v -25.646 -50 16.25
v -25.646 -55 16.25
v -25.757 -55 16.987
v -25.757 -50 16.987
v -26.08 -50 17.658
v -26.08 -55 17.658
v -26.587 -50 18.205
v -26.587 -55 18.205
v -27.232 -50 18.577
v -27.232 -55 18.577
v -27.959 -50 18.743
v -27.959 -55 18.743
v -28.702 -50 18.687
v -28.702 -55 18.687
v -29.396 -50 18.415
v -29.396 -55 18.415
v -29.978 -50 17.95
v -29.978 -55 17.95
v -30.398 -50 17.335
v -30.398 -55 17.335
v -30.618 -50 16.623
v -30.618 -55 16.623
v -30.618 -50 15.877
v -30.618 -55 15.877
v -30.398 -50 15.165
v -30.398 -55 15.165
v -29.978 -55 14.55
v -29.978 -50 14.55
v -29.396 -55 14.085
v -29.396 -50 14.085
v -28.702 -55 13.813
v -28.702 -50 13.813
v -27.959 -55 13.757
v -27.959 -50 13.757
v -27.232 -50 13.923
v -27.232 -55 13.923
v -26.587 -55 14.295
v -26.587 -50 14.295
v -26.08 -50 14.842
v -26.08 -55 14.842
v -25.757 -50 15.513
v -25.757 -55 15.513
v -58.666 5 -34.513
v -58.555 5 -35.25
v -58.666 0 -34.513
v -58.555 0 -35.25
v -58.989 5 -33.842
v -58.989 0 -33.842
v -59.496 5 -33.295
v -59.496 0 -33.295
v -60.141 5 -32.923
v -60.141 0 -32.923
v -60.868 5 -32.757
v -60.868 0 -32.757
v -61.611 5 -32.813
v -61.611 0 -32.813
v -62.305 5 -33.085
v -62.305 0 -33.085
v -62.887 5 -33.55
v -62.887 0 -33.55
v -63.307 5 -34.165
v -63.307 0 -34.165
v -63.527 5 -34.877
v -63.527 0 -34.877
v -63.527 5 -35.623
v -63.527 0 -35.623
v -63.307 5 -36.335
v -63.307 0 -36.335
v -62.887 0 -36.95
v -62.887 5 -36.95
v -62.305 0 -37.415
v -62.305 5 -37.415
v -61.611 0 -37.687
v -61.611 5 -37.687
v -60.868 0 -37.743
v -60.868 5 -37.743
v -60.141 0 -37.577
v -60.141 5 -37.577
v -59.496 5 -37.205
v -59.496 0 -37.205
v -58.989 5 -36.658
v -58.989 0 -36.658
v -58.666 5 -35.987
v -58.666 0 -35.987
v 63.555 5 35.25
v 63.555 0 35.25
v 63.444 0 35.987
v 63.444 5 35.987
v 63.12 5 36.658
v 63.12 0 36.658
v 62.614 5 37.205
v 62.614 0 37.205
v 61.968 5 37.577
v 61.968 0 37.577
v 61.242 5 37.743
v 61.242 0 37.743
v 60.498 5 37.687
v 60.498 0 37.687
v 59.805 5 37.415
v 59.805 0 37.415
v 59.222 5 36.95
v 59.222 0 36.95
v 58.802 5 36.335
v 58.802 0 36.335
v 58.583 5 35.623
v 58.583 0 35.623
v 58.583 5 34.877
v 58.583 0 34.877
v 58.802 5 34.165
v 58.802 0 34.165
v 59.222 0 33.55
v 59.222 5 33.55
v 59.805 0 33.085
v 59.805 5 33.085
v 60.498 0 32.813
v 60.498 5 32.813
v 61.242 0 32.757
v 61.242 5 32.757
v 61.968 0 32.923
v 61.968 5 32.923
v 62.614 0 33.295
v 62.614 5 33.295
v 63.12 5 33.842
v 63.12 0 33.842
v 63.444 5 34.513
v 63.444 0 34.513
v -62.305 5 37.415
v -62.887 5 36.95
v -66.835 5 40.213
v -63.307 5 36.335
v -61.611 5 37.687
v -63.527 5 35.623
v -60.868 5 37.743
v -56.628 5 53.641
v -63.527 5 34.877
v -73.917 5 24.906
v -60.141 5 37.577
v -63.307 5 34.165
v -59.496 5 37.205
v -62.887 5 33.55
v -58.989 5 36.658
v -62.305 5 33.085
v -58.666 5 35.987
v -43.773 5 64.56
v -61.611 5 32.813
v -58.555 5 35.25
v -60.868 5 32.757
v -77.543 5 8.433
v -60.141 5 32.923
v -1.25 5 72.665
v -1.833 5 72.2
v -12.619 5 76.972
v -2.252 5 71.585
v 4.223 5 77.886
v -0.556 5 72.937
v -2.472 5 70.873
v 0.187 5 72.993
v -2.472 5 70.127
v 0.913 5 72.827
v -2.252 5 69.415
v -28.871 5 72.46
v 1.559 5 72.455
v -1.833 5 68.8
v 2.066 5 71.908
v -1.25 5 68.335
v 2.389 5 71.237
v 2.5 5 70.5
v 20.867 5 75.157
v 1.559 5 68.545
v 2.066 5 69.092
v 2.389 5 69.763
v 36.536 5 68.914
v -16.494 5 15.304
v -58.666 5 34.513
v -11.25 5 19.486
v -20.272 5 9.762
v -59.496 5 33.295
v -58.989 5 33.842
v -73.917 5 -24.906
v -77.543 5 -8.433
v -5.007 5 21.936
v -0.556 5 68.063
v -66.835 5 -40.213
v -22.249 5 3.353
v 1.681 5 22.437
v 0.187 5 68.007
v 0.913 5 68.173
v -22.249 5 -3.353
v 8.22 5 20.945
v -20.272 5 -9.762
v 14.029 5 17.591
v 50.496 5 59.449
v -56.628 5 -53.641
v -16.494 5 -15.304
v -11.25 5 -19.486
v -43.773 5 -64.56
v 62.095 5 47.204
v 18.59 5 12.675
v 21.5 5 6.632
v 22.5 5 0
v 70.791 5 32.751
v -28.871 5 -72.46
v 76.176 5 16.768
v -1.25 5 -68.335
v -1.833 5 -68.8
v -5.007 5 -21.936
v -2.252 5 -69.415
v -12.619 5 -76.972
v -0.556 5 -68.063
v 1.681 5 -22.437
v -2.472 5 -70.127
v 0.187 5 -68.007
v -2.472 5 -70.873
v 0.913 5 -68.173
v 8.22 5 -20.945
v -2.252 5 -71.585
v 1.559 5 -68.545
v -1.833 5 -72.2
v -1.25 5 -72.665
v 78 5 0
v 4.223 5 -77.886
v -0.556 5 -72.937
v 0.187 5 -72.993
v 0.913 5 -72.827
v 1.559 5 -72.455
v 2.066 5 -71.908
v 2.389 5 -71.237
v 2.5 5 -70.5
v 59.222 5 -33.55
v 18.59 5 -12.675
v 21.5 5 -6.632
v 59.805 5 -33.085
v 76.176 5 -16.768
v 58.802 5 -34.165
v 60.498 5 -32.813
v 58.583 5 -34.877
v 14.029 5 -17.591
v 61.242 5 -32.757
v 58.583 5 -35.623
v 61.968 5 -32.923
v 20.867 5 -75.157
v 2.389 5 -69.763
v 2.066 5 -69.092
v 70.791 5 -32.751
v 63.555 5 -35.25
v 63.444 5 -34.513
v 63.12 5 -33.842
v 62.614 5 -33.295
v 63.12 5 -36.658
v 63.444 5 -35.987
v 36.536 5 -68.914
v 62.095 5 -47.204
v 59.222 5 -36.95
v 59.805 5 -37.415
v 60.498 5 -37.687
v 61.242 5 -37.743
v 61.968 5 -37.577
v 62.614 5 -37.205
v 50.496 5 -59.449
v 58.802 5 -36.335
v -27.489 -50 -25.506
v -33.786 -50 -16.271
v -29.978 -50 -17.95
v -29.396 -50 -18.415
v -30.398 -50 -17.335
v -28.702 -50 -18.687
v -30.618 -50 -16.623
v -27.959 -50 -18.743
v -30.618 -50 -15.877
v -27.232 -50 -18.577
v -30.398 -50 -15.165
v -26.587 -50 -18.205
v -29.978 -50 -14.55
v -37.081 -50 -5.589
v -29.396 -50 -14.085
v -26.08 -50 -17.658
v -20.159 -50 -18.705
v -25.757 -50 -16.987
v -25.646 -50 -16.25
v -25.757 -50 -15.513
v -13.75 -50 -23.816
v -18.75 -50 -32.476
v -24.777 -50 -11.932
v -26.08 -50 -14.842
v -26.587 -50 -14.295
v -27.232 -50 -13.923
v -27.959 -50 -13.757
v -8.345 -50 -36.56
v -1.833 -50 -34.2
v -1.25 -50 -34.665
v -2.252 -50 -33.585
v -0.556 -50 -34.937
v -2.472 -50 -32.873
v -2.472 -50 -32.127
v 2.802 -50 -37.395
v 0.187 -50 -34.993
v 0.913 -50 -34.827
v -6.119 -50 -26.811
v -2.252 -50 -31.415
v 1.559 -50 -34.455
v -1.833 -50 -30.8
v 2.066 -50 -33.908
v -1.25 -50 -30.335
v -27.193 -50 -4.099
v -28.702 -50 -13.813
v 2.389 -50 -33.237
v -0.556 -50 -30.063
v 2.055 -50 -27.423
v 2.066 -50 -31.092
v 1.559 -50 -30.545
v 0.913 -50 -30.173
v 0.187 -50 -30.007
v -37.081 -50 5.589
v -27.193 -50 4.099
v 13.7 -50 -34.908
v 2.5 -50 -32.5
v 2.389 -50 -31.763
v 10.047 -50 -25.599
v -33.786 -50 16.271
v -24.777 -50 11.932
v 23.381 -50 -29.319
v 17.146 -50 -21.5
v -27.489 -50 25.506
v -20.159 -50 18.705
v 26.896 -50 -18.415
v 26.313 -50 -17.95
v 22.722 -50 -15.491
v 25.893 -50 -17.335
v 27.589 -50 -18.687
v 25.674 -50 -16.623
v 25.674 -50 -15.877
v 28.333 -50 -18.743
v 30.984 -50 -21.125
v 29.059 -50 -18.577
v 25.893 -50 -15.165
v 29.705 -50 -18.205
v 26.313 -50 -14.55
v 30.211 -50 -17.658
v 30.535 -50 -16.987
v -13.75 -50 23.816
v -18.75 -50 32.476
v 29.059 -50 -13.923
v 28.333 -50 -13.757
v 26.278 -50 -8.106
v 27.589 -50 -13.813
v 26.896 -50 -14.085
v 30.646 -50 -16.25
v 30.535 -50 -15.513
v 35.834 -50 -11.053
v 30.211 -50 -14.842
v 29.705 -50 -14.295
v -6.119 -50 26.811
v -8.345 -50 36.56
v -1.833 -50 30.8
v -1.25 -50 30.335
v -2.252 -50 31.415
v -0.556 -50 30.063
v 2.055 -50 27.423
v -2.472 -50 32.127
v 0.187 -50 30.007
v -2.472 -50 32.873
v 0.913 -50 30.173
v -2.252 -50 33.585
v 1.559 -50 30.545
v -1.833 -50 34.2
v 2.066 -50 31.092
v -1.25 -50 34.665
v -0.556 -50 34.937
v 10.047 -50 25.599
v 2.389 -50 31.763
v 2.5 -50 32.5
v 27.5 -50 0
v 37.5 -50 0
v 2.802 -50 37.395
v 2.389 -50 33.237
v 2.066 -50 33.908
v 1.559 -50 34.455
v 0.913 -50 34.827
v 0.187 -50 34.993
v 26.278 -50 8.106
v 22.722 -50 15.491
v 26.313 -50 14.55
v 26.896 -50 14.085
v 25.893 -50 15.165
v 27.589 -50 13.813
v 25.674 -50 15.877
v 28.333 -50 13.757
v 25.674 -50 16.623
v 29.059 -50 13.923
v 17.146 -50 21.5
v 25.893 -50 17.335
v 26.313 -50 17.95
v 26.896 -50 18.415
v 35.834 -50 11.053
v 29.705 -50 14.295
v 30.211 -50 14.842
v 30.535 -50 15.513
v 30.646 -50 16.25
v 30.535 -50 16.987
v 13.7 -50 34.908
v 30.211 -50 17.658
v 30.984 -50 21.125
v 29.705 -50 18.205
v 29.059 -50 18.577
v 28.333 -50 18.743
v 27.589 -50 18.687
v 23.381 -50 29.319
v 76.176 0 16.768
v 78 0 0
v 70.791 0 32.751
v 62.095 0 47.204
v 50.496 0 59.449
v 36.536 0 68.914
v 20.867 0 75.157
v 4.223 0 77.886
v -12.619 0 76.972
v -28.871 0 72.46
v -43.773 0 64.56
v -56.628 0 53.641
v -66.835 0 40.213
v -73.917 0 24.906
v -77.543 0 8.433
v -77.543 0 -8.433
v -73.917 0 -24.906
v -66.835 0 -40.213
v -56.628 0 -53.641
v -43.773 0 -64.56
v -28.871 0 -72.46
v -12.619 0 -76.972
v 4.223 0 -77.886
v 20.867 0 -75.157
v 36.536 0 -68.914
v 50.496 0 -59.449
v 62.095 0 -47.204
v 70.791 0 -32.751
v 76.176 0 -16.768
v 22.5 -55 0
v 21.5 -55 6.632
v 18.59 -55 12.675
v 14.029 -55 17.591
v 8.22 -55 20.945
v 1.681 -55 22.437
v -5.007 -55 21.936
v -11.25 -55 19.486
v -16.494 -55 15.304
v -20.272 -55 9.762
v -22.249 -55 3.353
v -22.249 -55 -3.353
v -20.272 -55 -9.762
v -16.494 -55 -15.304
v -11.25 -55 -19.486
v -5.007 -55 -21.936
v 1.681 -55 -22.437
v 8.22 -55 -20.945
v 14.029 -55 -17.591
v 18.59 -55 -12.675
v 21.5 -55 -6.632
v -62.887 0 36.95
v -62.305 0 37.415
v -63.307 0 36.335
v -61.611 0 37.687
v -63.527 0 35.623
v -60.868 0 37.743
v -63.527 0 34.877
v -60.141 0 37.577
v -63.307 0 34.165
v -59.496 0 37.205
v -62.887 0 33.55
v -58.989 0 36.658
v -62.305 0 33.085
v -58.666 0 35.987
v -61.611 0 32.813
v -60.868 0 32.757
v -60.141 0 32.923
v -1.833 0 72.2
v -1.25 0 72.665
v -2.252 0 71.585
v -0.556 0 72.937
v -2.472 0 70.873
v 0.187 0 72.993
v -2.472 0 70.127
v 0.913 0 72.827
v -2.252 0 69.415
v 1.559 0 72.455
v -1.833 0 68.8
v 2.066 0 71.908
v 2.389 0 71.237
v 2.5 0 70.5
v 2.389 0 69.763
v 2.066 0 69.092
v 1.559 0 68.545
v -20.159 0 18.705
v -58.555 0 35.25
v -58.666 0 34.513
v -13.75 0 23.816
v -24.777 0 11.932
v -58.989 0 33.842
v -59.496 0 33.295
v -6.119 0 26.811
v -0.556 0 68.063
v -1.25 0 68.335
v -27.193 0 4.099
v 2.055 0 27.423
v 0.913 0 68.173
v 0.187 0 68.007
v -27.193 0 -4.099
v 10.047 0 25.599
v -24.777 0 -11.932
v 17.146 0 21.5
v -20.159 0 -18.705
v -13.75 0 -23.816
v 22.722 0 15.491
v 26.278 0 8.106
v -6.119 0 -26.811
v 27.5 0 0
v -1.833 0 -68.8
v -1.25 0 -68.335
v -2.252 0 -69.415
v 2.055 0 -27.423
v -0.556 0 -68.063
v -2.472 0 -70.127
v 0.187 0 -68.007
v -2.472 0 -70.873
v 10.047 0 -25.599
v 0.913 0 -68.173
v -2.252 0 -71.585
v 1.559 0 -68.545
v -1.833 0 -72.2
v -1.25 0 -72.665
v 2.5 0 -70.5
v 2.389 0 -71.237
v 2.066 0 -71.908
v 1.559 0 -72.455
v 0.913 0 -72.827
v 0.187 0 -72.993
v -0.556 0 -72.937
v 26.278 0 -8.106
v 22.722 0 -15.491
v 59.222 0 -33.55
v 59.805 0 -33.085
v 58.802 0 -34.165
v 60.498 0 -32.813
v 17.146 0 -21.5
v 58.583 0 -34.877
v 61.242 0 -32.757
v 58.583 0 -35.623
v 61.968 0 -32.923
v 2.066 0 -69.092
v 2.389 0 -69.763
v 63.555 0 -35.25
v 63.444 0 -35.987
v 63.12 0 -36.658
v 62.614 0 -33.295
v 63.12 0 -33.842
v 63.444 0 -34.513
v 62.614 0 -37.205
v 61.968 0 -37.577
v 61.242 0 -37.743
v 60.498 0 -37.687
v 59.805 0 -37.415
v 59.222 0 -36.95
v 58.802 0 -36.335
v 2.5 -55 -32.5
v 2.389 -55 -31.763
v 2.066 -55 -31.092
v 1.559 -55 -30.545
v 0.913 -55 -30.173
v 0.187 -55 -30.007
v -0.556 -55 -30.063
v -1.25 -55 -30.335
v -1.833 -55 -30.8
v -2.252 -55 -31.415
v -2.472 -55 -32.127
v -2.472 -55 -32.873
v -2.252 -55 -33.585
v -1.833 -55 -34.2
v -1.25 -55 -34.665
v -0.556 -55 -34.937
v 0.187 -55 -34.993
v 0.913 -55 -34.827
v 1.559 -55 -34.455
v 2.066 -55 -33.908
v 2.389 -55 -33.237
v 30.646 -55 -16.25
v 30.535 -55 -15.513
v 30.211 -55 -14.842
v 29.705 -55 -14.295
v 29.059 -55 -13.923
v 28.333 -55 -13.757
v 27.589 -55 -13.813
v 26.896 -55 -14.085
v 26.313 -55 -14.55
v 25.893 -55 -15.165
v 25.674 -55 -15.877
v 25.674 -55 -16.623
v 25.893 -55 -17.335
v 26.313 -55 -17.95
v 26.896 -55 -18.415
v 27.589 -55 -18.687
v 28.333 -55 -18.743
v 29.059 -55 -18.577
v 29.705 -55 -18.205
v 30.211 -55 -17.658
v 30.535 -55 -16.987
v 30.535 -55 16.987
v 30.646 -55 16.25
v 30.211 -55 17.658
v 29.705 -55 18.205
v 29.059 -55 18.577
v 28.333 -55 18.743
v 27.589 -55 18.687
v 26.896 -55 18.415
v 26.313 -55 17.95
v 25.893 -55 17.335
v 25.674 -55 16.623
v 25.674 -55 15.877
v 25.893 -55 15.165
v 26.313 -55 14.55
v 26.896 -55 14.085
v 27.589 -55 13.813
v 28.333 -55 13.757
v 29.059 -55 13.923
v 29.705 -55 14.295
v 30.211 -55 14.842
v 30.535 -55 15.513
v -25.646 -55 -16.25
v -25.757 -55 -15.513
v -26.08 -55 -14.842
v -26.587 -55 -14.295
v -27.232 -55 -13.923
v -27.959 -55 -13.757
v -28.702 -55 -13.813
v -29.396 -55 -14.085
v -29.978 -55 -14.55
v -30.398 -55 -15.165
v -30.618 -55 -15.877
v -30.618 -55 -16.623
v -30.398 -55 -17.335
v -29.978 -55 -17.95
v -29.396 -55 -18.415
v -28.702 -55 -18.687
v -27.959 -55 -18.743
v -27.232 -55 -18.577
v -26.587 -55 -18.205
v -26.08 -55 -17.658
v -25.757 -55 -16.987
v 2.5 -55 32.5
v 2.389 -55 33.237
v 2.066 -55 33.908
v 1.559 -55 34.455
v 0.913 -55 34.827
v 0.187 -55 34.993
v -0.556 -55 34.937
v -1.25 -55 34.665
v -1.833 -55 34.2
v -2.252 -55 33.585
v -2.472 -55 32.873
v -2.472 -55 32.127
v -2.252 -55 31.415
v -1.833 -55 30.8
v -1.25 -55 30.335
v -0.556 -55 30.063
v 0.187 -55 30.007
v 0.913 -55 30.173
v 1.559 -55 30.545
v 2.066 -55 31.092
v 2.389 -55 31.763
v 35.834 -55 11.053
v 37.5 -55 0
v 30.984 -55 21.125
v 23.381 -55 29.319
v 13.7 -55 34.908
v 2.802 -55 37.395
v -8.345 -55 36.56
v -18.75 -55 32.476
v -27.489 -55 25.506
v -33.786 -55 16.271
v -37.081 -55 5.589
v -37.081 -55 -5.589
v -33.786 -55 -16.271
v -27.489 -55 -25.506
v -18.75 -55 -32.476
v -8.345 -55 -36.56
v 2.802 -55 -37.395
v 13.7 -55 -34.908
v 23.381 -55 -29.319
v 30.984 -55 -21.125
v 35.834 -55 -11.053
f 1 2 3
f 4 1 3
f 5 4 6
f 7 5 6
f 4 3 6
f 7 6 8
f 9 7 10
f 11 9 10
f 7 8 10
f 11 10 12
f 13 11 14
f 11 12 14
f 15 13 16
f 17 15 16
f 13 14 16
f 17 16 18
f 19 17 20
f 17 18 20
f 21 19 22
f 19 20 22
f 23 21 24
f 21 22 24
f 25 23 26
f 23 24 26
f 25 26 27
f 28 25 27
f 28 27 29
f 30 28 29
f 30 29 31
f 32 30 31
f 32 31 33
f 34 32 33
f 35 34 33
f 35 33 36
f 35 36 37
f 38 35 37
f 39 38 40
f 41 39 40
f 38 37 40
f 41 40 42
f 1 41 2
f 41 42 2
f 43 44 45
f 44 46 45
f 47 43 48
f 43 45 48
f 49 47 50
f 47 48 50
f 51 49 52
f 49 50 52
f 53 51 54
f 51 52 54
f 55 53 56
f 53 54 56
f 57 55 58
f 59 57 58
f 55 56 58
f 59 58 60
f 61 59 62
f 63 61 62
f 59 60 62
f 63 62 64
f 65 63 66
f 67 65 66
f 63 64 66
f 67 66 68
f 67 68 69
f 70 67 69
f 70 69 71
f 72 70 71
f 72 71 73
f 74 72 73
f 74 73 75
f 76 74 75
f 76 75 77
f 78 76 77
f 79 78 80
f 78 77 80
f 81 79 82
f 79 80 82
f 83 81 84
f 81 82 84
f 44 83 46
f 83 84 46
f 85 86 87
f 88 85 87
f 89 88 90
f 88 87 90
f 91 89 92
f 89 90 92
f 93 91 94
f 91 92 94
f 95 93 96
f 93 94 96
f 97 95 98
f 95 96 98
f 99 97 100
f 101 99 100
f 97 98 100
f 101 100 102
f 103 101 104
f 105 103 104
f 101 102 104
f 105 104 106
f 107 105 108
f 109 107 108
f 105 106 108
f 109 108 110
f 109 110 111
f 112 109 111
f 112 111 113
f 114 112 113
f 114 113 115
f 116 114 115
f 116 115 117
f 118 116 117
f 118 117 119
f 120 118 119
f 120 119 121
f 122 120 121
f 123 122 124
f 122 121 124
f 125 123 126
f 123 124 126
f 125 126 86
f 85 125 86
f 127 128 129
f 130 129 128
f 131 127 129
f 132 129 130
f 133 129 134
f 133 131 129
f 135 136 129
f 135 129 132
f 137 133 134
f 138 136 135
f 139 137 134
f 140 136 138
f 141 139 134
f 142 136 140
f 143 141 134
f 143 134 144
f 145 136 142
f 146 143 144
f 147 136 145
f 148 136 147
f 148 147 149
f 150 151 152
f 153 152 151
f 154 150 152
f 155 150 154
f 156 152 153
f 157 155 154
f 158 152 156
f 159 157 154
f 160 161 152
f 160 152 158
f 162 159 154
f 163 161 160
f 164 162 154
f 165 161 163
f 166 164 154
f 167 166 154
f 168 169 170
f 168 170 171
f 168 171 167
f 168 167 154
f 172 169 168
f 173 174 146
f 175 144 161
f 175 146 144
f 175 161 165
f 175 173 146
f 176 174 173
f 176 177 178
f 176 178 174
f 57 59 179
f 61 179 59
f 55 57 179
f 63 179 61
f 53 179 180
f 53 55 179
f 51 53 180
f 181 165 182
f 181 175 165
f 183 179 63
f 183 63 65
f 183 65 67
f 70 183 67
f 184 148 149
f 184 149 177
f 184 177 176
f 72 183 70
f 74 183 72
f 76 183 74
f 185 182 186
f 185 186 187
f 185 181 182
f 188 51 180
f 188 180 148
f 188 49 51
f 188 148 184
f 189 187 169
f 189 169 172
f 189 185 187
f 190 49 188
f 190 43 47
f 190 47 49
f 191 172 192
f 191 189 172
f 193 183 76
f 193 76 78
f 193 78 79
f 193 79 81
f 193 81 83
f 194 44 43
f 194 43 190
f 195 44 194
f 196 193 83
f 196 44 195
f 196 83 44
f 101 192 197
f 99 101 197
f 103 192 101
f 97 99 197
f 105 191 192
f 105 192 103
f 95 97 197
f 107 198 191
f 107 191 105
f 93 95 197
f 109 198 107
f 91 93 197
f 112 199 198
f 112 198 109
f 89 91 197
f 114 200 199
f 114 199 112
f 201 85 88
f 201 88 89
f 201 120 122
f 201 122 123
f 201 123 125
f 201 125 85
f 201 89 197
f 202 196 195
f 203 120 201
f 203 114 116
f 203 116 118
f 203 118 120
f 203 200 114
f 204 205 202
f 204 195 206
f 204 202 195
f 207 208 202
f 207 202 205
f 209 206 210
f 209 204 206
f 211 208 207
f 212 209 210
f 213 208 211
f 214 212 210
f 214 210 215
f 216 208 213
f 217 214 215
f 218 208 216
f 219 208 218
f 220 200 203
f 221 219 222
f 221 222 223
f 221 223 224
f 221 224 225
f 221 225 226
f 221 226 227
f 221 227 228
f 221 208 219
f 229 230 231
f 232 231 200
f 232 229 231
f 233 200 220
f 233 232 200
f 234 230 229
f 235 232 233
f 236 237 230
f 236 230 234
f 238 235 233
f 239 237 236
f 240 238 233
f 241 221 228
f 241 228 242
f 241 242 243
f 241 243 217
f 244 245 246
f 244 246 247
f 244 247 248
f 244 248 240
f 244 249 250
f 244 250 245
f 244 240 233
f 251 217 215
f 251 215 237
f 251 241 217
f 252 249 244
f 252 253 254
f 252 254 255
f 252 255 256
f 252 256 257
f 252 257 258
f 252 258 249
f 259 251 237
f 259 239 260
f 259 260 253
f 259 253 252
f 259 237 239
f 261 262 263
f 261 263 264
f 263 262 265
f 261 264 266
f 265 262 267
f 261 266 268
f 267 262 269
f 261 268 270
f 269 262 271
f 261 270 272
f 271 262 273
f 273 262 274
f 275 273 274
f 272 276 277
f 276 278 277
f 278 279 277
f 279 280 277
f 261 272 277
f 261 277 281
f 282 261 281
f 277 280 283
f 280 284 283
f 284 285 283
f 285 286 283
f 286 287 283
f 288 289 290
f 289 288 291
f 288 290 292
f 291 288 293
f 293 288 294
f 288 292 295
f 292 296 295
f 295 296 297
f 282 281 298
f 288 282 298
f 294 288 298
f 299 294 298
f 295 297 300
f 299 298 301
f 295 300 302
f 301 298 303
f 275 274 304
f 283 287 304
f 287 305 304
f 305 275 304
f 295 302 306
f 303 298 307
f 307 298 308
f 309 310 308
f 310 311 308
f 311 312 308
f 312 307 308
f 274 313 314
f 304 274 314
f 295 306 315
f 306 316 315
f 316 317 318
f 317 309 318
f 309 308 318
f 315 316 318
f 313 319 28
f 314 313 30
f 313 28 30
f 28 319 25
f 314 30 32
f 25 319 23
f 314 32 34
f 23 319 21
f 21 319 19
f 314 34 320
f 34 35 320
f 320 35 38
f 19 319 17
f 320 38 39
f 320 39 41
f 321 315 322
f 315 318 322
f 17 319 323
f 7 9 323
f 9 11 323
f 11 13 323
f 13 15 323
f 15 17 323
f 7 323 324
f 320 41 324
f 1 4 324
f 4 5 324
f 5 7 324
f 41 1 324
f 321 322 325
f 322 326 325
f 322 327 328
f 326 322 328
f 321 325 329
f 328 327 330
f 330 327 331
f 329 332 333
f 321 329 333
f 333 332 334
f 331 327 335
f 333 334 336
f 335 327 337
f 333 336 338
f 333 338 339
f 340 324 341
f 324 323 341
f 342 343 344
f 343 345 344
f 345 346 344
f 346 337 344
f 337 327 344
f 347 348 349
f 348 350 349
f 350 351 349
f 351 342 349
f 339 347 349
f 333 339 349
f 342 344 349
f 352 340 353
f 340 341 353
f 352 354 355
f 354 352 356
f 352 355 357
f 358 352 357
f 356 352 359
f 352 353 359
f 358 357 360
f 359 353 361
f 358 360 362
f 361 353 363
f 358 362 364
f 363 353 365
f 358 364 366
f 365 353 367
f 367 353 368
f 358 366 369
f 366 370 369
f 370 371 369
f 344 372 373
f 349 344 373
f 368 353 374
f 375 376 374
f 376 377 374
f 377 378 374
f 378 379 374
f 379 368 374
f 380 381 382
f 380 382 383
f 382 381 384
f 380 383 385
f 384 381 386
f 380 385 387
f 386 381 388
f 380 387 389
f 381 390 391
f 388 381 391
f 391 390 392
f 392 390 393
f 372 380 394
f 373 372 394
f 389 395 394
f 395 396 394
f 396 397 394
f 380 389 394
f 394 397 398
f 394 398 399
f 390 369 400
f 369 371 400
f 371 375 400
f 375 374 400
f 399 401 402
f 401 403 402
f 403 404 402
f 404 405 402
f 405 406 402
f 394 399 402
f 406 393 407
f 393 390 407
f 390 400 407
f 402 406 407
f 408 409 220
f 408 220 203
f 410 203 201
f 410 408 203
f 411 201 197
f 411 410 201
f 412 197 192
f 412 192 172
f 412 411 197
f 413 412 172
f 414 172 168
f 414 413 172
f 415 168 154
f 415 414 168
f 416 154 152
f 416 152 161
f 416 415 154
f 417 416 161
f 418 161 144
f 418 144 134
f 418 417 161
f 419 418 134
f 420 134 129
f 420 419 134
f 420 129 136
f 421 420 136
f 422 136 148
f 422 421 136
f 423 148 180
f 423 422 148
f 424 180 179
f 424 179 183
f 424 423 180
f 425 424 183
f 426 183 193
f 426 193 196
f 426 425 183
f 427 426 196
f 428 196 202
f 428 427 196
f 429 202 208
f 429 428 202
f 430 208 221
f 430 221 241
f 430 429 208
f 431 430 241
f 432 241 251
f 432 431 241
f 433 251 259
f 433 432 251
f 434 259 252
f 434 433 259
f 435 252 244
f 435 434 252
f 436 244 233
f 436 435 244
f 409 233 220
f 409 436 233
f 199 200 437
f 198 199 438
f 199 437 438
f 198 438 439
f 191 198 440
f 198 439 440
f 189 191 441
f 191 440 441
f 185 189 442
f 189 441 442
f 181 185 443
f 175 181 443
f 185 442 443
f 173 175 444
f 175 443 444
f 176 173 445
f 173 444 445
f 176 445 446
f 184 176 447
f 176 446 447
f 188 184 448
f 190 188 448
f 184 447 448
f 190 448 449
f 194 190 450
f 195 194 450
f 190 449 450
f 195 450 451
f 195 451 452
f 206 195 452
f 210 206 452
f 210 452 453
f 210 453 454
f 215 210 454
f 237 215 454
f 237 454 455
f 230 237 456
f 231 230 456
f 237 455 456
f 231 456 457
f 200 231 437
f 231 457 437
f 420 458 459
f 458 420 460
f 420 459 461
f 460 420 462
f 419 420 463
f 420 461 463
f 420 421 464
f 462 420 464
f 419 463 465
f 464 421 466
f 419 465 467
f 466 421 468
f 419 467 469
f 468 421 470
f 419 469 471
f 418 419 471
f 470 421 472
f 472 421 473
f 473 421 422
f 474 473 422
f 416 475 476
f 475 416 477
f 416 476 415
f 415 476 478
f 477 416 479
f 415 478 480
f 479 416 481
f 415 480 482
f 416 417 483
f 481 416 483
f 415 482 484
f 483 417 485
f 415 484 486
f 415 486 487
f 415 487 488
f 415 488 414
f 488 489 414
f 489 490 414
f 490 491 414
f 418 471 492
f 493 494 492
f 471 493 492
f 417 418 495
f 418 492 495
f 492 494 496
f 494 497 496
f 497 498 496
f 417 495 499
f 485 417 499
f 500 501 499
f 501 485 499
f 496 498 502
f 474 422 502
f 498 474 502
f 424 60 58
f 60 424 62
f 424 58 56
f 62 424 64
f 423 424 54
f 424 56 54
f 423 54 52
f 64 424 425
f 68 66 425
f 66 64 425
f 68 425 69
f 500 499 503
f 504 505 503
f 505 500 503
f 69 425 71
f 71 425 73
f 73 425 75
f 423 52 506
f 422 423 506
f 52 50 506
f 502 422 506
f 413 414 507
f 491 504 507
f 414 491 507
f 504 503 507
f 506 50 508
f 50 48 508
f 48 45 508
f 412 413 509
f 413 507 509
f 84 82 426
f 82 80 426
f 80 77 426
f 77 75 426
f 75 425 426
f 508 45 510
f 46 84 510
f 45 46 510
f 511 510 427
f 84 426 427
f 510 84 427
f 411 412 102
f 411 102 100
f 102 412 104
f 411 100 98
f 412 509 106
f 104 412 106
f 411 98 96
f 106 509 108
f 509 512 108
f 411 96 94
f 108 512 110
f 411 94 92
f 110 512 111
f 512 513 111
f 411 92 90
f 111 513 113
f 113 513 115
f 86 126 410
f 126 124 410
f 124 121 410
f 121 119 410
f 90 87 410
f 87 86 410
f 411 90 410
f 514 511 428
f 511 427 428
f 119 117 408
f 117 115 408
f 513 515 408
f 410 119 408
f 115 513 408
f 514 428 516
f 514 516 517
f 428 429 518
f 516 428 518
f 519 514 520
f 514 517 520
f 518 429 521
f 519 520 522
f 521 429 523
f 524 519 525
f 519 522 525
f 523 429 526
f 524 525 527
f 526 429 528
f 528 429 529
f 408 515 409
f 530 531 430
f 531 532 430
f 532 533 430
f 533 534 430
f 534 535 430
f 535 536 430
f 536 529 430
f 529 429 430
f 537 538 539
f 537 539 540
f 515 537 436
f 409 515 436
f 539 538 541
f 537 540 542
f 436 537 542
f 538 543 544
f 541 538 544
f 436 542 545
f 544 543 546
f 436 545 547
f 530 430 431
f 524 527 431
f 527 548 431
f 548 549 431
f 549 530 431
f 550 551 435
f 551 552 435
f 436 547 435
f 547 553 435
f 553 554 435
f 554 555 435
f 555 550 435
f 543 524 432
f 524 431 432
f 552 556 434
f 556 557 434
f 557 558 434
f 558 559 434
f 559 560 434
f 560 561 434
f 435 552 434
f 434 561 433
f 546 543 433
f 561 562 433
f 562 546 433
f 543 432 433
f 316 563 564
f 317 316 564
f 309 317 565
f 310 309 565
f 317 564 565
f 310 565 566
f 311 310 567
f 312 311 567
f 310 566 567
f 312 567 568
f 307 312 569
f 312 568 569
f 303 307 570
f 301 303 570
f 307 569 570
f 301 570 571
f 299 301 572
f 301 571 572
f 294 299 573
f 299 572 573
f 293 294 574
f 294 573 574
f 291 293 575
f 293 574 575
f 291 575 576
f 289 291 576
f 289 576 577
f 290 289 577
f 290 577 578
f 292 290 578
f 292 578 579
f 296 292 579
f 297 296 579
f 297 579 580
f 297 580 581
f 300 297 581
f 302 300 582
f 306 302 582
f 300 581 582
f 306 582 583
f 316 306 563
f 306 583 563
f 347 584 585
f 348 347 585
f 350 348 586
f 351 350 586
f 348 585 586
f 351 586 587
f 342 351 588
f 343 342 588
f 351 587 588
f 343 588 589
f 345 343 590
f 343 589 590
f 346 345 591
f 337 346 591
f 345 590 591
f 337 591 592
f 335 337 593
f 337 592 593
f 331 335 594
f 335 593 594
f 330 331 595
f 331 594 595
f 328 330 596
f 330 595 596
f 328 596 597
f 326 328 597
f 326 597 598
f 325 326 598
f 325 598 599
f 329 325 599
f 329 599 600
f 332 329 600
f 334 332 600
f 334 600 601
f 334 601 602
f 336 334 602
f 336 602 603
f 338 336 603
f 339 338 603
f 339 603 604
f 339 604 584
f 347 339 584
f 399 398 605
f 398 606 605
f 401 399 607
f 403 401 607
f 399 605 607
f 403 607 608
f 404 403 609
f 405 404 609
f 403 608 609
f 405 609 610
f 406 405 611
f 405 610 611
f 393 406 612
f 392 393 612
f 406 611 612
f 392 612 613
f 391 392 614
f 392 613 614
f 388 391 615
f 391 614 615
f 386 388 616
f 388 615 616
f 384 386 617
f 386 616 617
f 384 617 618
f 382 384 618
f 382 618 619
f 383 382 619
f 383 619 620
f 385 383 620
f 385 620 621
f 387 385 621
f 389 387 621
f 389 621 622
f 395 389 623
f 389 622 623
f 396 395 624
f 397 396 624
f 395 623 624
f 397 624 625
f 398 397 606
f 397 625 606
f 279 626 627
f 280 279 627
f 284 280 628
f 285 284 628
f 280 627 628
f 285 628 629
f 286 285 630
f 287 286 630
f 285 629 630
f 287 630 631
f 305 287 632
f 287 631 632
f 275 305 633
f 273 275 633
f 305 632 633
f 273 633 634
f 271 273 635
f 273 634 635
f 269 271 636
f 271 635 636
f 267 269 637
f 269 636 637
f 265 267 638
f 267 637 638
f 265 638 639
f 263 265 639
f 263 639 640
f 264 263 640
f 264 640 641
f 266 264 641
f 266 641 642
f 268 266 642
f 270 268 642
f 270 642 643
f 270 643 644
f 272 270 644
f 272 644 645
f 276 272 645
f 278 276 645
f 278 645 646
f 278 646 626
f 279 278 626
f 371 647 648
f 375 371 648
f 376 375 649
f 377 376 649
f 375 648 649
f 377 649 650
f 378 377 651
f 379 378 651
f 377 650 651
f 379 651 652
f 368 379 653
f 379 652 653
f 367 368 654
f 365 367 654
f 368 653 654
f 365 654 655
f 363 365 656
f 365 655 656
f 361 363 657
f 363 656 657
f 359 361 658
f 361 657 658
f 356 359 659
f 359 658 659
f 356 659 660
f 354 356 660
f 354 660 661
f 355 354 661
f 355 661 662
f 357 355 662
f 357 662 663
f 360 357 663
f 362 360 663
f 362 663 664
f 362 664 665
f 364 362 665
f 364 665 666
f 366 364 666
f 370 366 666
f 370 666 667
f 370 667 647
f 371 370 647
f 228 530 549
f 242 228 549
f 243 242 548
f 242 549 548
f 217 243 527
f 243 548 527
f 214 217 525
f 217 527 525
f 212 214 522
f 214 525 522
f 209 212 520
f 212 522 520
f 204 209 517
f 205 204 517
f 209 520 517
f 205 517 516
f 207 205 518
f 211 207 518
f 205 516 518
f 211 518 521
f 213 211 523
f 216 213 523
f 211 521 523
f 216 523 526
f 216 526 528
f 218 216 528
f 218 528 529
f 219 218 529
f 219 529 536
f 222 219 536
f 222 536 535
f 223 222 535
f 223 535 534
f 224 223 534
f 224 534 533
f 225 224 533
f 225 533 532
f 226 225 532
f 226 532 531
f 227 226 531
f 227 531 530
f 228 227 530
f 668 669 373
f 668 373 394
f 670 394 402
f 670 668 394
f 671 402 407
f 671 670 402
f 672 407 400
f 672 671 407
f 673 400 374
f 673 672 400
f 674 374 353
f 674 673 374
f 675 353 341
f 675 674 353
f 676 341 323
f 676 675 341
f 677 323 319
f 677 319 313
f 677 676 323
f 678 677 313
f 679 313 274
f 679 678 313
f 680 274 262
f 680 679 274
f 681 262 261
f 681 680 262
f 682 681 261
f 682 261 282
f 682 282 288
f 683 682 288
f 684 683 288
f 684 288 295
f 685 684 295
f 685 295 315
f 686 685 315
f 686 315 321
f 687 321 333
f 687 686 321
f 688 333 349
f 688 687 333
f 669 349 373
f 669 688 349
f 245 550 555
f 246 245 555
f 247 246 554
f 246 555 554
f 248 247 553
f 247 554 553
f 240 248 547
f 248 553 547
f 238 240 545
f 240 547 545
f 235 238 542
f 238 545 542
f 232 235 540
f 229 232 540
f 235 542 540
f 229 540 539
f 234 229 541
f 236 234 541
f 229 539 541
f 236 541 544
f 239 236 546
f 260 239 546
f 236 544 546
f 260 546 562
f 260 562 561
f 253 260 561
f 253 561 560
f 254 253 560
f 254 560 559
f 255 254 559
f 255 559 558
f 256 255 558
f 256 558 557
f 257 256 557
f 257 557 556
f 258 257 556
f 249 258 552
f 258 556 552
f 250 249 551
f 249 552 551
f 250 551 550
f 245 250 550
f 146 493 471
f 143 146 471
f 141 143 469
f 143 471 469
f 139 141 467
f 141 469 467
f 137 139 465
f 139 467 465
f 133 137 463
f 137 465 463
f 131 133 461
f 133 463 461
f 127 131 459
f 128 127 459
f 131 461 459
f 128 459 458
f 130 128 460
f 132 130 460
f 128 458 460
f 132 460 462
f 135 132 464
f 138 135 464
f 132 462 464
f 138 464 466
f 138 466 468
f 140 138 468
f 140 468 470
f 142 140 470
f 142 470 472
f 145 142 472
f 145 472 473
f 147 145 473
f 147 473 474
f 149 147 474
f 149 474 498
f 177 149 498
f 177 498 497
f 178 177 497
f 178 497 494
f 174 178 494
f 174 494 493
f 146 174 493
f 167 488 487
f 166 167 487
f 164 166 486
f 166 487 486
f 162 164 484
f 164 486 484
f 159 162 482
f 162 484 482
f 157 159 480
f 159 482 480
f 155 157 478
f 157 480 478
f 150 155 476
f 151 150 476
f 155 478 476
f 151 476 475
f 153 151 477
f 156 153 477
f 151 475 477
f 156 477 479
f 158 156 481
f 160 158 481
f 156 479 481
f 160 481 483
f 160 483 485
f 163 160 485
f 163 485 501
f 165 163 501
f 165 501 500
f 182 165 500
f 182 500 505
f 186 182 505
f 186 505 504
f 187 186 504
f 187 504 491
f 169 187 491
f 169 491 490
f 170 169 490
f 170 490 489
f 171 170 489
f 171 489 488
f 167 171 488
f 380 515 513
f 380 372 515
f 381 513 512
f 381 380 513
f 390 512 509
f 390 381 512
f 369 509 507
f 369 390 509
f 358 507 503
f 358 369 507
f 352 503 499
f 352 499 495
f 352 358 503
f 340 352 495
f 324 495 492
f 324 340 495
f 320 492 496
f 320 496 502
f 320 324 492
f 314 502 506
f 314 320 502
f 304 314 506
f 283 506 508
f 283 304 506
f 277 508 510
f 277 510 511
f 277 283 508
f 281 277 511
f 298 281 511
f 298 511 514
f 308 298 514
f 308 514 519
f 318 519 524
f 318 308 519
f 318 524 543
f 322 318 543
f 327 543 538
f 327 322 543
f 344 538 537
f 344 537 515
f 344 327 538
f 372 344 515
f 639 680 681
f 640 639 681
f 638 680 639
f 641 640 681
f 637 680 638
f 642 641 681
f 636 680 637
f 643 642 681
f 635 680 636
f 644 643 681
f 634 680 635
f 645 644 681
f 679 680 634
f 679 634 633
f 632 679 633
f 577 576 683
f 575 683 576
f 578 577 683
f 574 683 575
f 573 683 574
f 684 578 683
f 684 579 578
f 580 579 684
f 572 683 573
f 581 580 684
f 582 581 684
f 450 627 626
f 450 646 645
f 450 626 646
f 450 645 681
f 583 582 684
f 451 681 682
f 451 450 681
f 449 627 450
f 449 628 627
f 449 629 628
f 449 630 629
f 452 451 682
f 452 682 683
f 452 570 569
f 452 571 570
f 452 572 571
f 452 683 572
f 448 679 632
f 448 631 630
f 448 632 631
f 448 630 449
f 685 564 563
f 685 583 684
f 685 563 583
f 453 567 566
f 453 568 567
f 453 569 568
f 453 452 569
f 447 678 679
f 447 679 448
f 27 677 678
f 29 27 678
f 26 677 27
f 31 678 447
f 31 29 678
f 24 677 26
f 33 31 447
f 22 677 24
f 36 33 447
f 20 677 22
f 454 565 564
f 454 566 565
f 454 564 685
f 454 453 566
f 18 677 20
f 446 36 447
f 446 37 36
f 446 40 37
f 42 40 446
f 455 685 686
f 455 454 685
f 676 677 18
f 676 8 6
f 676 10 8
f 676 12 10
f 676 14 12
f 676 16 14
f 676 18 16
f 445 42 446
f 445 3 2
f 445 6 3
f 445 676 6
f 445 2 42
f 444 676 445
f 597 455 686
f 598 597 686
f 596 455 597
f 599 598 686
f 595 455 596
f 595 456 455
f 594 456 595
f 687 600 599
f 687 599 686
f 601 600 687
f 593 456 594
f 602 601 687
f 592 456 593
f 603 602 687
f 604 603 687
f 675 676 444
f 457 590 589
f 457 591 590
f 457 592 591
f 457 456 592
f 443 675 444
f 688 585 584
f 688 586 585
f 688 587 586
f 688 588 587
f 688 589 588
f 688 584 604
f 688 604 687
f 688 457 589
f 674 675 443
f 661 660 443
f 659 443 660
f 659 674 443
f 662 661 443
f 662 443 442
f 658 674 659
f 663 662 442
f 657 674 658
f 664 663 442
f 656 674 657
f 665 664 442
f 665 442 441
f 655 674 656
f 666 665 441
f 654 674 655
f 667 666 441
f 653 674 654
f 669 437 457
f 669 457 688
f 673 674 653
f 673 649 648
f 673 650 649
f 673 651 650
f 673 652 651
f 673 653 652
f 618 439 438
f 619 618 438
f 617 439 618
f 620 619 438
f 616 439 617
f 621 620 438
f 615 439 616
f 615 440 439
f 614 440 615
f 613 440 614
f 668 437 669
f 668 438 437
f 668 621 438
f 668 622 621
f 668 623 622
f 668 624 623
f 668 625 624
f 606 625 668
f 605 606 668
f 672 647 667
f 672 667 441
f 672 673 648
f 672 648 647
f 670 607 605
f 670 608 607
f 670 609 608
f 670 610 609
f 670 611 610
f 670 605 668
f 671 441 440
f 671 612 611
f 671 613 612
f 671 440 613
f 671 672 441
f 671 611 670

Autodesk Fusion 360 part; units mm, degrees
sketch "Sketch1" plane through (0, 0, 0) normal (0, 1, 0) x (1, 0, 0)
  circle A0 centre (0, 0) radius 63
  circle A1 centre (0, 0) radius 78
  circle A2 centre (0, 0) radius 22.5
  circle A3 centre (0, -70.5) radius 2.5
  circle A4 centre (61.0548, -35.25) radius 2.5
  circle A5 centre (61.0548, 35.25) radius 2.5
  circle A6 centre (0, 70.5) radius 2.5
  circle A7 centre (-61.0548, 35.25) radius 2.5
  circle A8 centre (-61.0548, -35.25) radius 2.5
  dimension "d1" = 126
  dimension "d2" = 15
  dimension "d3" = 45
  dimension "d14" = 5
  dimension "d15" = 70.5
  dimension "d17" = 360
extrude "Extrude1" add sketch "Sketch1" along normal blind 5 contours A1 | A3 | A4 | A5 | A6 | A7 | A8 makes body 1
move_face "OffsetFaces1" offset 65 1 faces at (62.9217, 3.3333, 3.1403) on bodies 1
extrude "Extrude2" add sketch "Sketch1" against normal blind 55 contours A2 bodies 1
sketch "Sketch3" plane through (0, -55, 0) normal (0, -1, 0) x (1, 0, 0)
  circle A0 centre (0, 0) radius 22.5
  circle A1 centre (0, 0) radius 37.5
  circle A2 centre (0, 32.5) radius 2.5
  circle A3 centre (-28.1458, 16.25) radius 2.5
  circle A4 centre (-28.1458, -16.25) radius 2.5
  circle A5 centre (0, -32.5) radius 2.5
  circle A6 centre (28.1458, -16.25) radius 2.5
  circle A7 centre (28.1458, 16.25) radius 2.5
  circle A8 centre (0, 0) radius 27.5
  dimension "d11" = 75
  dimension "d18" = 5
  dimension "d19" = 32.5
  dimension "d21" = 360
  dimension "d26" = 55
extrude "Extrude3" add sketch "Sketch3" against normal blind 5 contours A1 | A2 | A3 | A4 | A5 | A6 | A7 | A8 bodies 1
extrude "Extrude4" cut sketch "Sketch1" along normal blind 10 contours A3 | A4 | A5 | A6 | A7 | A8 bodies 1
extrude "Extrude5" cut sketch "Sketch3" against normal blind 10 contours A2 | A3 | A4 | A5 | A6 | A7 bodies 1
extrude "Extrude6" cut sketch "Sketch3" against normal blind 60 contours A0 bodies 1 makes body 2 at (40.4178, 0, -38.0861)
extrude "Extrude7" add sketch "Sketch3" against normal blind 60 contours A8 bodies 1 2
